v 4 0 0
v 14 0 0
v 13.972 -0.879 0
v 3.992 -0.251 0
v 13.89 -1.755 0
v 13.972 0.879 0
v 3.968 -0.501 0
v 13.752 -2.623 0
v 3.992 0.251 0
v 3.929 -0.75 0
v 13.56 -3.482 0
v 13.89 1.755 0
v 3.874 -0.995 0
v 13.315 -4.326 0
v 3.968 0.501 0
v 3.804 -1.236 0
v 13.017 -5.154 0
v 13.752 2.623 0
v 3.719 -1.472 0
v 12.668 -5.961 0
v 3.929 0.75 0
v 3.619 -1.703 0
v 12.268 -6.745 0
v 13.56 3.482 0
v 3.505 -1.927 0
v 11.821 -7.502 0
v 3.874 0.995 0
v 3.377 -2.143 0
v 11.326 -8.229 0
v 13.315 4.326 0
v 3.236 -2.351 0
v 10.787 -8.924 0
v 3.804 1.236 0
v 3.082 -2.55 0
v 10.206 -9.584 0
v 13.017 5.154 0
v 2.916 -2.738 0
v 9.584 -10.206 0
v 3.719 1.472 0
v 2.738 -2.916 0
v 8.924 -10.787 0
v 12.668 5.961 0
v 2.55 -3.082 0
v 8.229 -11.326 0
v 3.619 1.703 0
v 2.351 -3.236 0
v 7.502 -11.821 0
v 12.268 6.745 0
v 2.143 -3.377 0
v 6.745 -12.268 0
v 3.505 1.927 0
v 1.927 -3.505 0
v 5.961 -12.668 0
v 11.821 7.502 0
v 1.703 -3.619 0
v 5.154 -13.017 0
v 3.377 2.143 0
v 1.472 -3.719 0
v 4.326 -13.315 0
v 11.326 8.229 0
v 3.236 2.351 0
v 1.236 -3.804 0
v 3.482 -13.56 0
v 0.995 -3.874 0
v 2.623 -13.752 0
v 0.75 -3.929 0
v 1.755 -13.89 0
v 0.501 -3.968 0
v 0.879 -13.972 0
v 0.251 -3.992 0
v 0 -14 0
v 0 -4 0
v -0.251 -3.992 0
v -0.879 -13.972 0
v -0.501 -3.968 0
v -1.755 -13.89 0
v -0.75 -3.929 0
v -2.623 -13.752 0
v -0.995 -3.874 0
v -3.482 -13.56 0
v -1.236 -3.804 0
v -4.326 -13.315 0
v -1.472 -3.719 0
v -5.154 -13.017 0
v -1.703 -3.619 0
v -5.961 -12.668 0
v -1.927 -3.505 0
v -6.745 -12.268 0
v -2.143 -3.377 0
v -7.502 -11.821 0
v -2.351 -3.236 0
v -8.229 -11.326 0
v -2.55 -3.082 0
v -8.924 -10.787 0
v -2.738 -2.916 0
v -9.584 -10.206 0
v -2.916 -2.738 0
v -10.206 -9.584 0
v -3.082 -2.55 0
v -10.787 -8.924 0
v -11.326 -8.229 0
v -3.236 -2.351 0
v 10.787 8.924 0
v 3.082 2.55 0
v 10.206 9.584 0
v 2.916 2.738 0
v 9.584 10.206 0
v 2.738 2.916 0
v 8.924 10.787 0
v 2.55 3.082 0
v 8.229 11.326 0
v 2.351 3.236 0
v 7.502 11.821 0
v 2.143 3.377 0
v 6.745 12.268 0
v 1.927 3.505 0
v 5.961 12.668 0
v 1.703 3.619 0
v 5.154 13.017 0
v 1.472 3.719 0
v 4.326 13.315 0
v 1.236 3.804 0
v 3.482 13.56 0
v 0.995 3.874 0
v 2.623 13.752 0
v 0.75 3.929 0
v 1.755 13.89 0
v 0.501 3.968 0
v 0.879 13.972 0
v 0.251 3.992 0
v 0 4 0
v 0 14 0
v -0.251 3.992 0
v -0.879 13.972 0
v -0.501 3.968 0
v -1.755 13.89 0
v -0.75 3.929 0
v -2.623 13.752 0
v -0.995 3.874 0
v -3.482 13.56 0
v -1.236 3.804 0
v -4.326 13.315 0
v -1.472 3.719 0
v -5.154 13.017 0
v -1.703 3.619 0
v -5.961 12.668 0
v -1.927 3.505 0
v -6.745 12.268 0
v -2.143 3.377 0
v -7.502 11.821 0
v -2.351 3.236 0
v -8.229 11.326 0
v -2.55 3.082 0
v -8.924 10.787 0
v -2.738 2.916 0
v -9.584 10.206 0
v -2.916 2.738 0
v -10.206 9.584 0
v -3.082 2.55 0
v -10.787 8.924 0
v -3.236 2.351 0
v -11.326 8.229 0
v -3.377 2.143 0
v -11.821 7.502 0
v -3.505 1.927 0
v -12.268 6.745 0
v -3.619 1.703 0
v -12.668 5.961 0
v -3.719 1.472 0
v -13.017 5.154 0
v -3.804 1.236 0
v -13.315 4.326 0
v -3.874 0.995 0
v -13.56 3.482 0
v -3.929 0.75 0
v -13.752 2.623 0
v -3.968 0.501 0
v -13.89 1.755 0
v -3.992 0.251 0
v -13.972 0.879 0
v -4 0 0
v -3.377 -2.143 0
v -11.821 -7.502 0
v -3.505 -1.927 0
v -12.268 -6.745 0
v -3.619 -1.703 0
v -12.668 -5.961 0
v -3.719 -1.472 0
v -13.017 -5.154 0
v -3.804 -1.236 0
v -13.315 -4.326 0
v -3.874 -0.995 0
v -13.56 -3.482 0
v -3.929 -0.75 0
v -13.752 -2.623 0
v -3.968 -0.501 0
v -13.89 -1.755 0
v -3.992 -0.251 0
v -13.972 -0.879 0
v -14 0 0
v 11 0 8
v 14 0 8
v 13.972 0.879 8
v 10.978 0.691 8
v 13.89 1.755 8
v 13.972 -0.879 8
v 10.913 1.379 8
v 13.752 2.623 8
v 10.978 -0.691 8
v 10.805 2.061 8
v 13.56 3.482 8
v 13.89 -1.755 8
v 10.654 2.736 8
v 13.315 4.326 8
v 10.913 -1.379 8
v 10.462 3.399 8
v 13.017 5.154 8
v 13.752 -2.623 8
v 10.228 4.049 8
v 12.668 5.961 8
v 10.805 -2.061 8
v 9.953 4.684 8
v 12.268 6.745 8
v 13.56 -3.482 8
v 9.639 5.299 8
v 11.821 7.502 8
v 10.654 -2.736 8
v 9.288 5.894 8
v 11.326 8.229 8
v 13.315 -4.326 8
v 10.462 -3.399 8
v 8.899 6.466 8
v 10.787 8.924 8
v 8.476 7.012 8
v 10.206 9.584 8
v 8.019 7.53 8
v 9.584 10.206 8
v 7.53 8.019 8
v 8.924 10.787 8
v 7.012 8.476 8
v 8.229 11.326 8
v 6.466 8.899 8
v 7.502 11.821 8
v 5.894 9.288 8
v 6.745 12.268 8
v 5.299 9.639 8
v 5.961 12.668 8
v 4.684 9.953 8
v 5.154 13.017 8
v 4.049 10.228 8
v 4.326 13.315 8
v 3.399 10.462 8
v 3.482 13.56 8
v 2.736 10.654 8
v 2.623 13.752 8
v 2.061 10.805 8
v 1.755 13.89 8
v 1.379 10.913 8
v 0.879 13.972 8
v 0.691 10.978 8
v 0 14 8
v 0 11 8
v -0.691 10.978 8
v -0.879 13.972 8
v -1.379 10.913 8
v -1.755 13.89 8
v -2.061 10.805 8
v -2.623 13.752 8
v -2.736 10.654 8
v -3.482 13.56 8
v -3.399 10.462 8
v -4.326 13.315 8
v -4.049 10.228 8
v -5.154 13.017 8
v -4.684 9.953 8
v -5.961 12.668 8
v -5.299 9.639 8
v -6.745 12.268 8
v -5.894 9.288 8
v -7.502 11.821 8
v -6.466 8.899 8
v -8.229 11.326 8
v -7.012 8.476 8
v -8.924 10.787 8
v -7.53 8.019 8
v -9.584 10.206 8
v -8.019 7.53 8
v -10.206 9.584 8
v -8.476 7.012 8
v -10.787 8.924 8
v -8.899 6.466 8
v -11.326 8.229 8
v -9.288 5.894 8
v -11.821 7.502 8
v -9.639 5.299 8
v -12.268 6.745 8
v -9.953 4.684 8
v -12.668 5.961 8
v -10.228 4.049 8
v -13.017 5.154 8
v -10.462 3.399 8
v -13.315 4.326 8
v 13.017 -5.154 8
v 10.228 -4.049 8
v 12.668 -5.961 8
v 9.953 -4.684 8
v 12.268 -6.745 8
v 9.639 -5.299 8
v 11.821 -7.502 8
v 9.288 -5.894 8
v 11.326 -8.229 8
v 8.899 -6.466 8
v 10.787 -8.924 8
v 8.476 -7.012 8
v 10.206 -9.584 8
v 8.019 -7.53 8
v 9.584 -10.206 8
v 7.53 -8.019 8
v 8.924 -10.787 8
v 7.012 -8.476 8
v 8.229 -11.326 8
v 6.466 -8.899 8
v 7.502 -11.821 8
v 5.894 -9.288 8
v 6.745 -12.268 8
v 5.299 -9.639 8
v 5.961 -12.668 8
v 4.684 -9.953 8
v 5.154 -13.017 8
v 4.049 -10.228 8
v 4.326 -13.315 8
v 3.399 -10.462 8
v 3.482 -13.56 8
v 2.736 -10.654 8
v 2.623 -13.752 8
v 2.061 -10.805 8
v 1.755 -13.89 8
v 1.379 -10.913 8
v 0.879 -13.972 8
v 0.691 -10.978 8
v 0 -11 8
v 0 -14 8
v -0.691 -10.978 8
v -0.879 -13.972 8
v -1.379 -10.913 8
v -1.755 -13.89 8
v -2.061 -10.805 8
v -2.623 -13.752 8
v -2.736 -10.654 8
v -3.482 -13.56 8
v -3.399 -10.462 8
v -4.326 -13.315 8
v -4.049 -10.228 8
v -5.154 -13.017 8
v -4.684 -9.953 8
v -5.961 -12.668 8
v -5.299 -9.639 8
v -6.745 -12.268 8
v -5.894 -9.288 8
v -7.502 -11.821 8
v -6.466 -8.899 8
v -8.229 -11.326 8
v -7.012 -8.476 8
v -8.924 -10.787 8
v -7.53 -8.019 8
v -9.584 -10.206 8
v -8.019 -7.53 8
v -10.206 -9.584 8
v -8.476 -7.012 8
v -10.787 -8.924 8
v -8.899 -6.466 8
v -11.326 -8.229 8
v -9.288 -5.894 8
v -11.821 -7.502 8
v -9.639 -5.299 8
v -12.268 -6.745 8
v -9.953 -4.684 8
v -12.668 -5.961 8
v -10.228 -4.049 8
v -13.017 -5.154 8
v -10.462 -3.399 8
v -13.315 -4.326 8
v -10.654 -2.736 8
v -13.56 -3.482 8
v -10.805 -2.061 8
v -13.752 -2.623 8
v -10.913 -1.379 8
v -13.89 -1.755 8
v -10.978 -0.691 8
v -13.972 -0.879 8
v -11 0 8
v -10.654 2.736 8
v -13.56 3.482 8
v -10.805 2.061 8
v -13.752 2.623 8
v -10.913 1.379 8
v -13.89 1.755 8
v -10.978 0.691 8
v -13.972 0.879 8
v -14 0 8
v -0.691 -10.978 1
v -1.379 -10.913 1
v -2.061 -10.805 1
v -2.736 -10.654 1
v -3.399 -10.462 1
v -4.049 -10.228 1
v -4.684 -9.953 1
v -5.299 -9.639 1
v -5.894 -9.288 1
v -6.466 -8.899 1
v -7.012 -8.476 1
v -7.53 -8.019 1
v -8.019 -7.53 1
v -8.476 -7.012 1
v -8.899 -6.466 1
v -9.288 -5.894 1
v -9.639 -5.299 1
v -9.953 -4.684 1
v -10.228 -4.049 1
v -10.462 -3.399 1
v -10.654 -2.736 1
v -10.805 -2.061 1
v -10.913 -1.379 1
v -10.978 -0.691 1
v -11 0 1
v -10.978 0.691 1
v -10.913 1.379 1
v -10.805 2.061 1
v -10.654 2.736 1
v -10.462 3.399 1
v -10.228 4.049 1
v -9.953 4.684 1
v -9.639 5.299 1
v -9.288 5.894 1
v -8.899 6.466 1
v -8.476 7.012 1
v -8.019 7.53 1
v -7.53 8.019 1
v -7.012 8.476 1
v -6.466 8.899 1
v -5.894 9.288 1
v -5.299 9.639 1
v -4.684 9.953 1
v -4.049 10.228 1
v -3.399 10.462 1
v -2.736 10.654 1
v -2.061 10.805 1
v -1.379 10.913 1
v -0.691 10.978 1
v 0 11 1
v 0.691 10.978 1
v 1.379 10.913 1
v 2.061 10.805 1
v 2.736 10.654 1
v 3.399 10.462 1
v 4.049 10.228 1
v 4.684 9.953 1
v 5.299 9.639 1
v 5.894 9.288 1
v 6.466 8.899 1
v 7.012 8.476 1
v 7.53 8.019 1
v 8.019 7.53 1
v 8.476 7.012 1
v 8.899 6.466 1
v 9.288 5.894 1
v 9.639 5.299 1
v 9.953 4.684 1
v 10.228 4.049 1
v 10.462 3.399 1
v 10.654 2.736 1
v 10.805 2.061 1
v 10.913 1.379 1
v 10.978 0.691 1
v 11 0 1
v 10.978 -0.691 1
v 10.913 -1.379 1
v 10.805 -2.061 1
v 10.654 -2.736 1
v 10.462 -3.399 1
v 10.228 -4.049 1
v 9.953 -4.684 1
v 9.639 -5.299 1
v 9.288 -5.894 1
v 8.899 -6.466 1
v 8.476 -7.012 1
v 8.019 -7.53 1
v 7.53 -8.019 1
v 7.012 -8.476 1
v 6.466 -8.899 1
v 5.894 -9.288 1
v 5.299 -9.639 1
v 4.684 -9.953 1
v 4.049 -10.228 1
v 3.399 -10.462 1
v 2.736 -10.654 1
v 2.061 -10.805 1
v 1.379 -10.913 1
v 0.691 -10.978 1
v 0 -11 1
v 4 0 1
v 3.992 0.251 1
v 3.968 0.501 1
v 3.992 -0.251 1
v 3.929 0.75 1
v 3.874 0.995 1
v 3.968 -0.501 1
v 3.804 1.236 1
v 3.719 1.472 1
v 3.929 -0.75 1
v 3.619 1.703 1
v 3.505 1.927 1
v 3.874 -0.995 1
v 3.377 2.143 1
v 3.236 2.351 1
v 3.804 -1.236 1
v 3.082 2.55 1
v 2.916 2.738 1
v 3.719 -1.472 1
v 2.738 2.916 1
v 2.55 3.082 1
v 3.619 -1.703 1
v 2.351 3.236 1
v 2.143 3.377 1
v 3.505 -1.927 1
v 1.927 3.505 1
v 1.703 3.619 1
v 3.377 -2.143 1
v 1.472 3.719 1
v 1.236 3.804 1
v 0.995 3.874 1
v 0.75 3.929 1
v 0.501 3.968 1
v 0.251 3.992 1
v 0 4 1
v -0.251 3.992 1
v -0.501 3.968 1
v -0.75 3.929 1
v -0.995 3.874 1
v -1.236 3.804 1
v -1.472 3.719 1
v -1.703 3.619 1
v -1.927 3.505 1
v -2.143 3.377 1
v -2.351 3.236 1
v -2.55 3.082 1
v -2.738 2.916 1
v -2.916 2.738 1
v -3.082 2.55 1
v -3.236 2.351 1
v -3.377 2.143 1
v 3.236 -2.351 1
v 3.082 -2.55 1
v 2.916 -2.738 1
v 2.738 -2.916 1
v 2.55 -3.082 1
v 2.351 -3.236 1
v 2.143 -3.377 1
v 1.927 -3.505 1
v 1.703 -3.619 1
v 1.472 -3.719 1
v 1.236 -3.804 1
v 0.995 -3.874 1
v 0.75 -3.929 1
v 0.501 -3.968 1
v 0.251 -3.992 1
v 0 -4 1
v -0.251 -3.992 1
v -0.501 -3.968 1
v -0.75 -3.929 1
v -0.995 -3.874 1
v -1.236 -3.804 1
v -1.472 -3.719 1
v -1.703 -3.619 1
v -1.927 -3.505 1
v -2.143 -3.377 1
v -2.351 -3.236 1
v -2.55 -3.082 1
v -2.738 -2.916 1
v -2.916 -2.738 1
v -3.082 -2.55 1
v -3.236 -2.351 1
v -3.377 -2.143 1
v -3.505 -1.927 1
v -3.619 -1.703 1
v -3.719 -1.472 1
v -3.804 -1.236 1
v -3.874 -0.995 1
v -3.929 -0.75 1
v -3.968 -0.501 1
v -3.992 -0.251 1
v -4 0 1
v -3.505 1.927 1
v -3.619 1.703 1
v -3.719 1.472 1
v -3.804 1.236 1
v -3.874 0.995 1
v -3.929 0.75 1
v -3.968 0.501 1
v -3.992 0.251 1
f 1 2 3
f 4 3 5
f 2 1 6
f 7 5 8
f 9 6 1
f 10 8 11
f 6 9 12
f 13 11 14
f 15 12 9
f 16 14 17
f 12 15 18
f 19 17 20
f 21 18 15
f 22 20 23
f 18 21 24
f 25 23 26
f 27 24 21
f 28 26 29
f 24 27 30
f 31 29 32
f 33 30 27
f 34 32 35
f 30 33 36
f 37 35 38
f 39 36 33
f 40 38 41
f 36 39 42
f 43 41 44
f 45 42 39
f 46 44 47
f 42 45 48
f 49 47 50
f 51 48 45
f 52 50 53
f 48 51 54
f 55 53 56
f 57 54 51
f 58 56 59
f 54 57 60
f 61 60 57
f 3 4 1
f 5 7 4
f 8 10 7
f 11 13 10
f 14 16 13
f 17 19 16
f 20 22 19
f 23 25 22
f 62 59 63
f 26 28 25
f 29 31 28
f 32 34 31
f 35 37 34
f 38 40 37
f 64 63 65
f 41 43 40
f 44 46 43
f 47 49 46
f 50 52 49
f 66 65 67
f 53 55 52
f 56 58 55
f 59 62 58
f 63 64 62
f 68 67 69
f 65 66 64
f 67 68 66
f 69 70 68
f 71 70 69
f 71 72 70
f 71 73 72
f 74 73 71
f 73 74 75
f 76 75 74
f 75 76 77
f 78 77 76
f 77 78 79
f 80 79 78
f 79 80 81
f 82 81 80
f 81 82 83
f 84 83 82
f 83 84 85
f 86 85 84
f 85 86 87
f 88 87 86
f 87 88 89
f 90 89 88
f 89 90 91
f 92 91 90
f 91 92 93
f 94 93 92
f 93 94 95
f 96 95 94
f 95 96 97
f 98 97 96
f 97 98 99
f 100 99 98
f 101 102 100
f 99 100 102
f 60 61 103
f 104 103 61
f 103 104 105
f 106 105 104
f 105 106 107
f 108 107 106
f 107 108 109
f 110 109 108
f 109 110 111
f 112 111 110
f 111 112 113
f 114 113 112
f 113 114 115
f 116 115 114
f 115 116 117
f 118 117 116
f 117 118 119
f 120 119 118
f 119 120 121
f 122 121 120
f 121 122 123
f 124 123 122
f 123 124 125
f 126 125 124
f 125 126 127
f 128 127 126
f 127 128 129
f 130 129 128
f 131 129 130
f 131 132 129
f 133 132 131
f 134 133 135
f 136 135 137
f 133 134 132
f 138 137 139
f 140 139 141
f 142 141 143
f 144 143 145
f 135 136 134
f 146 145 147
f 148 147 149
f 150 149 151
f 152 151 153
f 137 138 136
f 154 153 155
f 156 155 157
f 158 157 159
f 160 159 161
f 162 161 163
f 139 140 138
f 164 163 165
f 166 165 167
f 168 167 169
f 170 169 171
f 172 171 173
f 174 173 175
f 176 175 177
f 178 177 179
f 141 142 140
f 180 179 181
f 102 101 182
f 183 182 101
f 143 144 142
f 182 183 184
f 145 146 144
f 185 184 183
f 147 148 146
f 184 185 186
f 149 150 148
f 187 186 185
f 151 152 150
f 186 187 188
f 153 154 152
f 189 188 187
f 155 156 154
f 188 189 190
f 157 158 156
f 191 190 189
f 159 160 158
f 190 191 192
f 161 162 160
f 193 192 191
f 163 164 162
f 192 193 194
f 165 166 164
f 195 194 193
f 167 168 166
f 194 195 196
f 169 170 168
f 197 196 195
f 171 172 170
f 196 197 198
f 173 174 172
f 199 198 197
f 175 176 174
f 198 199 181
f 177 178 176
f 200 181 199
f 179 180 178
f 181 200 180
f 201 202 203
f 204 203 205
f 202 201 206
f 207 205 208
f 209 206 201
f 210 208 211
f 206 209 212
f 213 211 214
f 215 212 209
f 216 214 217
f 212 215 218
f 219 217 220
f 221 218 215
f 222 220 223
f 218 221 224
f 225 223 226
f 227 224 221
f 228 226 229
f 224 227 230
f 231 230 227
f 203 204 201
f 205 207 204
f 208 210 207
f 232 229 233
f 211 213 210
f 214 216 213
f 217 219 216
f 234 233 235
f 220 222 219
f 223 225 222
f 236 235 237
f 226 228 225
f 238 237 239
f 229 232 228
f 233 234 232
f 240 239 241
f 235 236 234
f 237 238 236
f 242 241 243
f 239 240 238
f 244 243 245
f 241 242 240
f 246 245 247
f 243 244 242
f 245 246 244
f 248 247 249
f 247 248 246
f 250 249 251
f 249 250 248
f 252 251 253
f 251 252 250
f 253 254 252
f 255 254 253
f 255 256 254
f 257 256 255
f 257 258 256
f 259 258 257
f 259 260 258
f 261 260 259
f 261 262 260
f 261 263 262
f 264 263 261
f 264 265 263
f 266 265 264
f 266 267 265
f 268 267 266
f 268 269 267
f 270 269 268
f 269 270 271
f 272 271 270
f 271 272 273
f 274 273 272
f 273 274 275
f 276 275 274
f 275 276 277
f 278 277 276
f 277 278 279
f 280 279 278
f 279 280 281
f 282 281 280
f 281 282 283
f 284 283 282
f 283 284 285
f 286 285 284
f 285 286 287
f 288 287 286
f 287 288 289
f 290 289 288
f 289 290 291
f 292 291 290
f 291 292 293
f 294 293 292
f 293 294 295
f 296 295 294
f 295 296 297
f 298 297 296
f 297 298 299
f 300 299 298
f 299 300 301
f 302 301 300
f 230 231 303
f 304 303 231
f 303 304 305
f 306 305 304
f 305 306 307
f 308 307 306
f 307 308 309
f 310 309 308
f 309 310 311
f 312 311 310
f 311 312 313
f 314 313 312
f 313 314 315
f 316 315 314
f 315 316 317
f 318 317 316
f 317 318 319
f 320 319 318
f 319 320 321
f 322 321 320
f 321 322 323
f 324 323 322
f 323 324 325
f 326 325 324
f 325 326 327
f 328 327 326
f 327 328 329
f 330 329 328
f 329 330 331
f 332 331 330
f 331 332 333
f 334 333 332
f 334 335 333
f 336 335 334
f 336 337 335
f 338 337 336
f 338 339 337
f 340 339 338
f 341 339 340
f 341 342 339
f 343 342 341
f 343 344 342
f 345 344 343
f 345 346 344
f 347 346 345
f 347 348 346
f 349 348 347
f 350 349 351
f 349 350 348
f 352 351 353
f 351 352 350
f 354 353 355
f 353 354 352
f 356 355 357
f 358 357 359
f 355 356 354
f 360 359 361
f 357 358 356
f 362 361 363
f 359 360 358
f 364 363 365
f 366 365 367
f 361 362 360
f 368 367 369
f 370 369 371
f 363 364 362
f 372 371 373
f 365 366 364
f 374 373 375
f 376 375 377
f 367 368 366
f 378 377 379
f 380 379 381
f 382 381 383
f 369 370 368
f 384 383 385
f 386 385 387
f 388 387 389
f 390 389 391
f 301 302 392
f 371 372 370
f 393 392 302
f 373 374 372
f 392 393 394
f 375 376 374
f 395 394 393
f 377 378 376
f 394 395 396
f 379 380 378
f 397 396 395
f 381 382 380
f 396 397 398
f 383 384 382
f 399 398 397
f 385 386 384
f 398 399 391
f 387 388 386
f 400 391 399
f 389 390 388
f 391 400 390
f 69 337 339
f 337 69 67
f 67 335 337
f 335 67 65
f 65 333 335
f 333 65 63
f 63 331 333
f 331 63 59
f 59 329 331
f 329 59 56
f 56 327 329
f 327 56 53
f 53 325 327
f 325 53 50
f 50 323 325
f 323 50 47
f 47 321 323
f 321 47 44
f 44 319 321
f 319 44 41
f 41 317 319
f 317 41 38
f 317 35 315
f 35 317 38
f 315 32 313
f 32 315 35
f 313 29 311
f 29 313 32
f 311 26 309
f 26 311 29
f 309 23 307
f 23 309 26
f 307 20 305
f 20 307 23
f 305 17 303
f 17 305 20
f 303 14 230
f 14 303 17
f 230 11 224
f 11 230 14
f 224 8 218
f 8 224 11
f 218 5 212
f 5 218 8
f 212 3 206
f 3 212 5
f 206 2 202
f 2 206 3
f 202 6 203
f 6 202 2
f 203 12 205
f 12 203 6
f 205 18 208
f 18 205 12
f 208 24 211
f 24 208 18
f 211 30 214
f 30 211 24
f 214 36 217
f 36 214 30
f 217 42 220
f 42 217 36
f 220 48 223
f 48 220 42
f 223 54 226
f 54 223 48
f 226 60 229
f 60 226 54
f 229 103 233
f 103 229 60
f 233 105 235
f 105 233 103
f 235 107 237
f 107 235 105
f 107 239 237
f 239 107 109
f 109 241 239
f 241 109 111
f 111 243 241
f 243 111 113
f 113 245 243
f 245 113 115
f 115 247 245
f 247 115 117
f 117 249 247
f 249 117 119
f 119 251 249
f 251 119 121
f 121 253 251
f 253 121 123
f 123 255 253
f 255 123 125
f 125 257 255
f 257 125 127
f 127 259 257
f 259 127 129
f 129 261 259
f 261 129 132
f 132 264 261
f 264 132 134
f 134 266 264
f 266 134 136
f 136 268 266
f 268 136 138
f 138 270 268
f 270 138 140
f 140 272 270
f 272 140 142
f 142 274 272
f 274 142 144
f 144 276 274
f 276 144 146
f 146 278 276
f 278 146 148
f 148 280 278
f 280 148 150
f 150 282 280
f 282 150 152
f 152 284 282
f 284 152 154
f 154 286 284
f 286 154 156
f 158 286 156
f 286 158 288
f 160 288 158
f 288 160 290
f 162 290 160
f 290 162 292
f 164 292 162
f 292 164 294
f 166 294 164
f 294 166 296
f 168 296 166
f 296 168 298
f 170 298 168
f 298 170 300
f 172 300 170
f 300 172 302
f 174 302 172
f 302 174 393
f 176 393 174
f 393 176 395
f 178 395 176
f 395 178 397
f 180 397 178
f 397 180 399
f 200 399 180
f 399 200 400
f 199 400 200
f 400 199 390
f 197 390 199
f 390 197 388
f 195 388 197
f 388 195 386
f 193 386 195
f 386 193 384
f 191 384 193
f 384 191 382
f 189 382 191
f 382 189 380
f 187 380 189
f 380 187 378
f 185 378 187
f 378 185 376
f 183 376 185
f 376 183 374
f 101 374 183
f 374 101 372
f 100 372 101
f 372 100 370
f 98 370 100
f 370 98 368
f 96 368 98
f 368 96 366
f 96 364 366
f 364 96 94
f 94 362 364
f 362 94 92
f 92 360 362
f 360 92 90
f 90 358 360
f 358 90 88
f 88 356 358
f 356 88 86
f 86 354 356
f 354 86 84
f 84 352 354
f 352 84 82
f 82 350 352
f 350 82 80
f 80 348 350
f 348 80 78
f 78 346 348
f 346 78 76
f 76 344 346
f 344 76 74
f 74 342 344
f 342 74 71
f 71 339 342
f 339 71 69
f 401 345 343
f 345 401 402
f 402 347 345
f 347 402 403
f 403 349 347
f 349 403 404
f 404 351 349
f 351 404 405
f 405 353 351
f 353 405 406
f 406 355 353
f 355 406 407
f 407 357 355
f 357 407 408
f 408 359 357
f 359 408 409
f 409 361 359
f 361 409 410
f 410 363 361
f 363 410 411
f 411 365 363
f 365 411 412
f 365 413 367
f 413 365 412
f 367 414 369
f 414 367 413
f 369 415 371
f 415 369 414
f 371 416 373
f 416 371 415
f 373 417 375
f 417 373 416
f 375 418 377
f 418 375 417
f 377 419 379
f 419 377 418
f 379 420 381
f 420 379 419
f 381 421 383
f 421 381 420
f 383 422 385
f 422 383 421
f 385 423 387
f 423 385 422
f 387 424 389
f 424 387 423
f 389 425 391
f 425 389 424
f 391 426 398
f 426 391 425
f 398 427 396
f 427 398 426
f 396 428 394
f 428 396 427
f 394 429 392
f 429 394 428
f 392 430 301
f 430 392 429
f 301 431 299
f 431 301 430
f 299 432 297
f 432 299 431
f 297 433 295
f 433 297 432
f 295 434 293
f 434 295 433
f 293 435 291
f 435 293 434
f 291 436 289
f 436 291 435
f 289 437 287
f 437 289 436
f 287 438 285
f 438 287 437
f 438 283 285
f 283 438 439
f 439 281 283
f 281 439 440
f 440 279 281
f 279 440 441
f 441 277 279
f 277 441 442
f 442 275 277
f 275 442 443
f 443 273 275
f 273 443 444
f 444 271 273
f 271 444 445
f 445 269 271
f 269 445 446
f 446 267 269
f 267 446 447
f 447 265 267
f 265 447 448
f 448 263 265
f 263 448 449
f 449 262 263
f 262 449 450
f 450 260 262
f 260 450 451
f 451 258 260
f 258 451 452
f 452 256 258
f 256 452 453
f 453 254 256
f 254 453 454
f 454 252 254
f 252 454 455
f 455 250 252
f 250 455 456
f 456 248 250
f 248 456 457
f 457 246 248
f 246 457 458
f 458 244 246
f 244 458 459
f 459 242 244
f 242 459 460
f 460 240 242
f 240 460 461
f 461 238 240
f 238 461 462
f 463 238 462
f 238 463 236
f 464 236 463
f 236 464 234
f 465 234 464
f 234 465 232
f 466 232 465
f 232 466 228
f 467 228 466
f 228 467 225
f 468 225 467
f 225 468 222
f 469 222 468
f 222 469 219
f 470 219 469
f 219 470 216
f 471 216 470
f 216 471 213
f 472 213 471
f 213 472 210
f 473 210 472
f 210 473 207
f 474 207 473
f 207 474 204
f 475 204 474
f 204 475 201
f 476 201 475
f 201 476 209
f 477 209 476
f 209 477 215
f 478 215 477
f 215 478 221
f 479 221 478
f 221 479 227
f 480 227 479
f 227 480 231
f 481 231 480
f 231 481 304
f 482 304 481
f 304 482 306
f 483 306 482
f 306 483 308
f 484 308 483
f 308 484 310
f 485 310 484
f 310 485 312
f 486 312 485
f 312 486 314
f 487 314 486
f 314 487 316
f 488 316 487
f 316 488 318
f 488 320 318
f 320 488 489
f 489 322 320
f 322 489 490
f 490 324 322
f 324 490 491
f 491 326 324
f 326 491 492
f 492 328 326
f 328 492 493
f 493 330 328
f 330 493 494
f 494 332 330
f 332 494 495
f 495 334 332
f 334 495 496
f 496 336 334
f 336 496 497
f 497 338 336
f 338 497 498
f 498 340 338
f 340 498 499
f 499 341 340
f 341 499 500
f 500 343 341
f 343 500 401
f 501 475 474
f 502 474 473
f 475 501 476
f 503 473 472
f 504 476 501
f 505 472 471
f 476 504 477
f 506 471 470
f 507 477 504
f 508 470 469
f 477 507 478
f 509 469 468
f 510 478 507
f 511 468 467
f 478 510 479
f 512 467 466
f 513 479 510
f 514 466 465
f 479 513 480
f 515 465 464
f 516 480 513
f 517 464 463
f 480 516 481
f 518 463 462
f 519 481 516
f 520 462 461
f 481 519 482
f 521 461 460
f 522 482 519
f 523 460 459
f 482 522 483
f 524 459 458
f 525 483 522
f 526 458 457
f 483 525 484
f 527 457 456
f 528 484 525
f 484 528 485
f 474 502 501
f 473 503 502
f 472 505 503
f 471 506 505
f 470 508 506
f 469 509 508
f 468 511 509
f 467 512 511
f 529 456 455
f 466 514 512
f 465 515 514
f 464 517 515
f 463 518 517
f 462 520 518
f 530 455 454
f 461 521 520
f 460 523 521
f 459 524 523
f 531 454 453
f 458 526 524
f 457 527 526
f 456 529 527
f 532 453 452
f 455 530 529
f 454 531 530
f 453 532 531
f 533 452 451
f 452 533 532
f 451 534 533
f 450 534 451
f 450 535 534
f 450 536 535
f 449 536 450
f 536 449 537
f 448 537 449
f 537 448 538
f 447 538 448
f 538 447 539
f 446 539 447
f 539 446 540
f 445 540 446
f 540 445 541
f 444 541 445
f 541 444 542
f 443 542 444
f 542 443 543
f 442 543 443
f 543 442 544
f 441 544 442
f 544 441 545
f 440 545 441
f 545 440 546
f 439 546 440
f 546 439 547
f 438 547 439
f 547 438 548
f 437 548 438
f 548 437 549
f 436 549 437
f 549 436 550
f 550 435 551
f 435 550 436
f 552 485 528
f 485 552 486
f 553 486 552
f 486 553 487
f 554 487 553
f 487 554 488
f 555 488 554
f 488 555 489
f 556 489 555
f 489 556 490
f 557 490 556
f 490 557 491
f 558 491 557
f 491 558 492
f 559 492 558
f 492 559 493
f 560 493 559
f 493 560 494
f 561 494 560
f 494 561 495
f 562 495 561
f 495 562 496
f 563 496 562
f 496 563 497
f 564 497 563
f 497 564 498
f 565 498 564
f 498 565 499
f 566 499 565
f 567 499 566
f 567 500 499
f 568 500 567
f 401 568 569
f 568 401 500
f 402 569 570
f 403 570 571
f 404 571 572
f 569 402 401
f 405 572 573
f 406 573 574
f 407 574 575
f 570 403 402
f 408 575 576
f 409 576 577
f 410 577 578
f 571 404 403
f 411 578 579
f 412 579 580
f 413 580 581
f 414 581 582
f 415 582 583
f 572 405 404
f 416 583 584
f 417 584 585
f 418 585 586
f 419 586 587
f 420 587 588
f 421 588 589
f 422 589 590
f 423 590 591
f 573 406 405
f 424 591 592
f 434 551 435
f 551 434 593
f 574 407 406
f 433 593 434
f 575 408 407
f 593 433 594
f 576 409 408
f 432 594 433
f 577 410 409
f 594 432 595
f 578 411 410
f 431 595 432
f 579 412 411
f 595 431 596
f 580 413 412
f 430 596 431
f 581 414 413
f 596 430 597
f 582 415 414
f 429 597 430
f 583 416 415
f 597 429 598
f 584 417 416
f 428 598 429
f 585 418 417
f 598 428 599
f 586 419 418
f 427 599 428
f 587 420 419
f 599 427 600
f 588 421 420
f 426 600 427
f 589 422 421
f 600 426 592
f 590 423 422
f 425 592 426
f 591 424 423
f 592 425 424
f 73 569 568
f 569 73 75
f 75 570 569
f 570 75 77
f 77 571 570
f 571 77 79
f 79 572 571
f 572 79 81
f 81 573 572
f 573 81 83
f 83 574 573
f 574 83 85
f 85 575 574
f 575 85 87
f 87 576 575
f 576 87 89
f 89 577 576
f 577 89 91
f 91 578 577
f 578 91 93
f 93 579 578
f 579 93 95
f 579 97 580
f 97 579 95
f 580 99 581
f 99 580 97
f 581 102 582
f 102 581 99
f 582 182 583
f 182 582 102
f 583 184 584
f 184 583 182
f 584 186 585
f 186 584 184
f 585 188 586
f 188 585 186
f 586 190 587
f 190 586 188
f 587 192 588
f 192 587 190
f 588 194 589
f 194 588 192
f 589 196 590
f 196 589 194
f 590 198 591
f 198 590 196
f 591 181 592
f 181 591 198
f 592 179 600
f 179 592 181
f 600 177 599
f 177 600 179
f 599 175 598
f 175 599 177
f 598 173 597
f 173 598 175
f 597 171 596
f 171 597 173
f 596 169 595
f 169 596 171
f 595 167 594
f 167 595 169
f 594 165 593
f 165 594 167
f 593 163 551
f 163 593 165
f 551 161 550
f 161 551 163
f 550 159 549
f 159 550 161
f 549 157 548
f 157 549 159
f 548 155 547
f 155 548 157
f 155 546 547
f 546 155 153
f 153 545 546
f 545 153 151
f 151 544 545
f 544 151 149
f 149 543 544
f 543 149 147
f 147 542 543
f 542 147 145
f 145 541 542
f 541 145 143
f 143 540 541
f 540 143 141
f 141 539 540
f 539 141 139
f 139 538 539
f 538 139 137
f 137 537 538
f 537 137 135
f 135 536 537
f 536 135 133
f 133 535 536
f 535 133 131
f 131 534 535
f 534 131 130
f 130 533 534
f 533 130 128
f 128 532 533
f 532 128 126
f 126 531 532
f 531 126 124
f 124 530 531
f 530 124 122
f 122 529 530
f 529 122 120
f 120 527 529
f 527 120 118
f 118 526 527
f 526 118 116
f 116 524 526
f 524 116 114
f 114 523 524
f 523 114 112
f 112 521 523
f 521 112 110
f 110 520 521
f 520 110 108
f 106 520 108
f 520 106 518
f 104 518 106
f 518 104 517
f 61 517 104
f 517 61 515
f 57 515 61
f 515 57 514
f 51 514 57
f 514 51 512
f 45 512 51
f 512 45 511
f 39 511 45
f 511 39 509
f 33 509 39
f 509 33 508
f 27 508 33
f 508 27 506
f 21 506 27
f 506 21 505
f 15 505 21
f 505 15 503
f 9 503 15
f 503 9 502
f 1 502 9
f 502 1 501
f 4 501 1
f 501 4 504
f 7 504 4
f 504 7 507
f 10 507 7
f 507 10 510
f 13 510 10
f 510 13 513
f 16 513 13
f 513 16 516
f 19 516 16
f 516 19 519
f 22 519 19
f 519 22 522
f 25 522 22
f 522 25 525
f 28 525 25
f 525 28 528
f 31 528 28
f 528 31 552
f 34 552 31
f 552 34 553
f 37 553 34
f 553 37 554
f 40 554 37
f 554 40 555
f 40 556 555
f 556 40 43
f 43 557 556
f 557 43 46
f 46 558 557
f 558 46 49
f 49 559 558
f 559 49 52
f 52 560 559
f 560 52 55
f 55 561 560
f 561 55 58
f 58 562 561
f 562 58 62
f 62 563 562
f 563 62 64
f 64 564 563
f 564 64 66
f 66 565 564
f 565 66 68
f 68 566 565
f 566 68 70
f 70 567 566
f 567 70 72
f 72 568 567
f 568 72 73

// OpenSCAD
//Bearing 608 dimmentions
608_in_d = 8; //8mm hole diameter
608_out_d = 22;
608_width = 7;

tollerance = 0.0;

//Following wheel dimentions
follow_wheel_out_d = 608_out_d + (3 * 2); //3mm on each side
follow_wheel_in_d = 608_out_d + tollerance;
follow_wheel_cover_cap_depth = 1;
follow_wheel_depth = 608_width + follow_wheel_cover_cap_depth;

$fn=100;

linear_extrude(follow_wheel_depth)
difference()
{
    circle(d = follow_wheel_out_d);
    circle(d = follow_wheel_in_d);   
};
translate(0,0,-(follow_wheel_depth/2+follow_wheel_cover_cap_depth)) 
linear_extrude(follow_wheel_cover_cap_depth) 
difference(){
    circle(d = follow_wheel_out_d);
    circle(d = 608_in_d);
};
